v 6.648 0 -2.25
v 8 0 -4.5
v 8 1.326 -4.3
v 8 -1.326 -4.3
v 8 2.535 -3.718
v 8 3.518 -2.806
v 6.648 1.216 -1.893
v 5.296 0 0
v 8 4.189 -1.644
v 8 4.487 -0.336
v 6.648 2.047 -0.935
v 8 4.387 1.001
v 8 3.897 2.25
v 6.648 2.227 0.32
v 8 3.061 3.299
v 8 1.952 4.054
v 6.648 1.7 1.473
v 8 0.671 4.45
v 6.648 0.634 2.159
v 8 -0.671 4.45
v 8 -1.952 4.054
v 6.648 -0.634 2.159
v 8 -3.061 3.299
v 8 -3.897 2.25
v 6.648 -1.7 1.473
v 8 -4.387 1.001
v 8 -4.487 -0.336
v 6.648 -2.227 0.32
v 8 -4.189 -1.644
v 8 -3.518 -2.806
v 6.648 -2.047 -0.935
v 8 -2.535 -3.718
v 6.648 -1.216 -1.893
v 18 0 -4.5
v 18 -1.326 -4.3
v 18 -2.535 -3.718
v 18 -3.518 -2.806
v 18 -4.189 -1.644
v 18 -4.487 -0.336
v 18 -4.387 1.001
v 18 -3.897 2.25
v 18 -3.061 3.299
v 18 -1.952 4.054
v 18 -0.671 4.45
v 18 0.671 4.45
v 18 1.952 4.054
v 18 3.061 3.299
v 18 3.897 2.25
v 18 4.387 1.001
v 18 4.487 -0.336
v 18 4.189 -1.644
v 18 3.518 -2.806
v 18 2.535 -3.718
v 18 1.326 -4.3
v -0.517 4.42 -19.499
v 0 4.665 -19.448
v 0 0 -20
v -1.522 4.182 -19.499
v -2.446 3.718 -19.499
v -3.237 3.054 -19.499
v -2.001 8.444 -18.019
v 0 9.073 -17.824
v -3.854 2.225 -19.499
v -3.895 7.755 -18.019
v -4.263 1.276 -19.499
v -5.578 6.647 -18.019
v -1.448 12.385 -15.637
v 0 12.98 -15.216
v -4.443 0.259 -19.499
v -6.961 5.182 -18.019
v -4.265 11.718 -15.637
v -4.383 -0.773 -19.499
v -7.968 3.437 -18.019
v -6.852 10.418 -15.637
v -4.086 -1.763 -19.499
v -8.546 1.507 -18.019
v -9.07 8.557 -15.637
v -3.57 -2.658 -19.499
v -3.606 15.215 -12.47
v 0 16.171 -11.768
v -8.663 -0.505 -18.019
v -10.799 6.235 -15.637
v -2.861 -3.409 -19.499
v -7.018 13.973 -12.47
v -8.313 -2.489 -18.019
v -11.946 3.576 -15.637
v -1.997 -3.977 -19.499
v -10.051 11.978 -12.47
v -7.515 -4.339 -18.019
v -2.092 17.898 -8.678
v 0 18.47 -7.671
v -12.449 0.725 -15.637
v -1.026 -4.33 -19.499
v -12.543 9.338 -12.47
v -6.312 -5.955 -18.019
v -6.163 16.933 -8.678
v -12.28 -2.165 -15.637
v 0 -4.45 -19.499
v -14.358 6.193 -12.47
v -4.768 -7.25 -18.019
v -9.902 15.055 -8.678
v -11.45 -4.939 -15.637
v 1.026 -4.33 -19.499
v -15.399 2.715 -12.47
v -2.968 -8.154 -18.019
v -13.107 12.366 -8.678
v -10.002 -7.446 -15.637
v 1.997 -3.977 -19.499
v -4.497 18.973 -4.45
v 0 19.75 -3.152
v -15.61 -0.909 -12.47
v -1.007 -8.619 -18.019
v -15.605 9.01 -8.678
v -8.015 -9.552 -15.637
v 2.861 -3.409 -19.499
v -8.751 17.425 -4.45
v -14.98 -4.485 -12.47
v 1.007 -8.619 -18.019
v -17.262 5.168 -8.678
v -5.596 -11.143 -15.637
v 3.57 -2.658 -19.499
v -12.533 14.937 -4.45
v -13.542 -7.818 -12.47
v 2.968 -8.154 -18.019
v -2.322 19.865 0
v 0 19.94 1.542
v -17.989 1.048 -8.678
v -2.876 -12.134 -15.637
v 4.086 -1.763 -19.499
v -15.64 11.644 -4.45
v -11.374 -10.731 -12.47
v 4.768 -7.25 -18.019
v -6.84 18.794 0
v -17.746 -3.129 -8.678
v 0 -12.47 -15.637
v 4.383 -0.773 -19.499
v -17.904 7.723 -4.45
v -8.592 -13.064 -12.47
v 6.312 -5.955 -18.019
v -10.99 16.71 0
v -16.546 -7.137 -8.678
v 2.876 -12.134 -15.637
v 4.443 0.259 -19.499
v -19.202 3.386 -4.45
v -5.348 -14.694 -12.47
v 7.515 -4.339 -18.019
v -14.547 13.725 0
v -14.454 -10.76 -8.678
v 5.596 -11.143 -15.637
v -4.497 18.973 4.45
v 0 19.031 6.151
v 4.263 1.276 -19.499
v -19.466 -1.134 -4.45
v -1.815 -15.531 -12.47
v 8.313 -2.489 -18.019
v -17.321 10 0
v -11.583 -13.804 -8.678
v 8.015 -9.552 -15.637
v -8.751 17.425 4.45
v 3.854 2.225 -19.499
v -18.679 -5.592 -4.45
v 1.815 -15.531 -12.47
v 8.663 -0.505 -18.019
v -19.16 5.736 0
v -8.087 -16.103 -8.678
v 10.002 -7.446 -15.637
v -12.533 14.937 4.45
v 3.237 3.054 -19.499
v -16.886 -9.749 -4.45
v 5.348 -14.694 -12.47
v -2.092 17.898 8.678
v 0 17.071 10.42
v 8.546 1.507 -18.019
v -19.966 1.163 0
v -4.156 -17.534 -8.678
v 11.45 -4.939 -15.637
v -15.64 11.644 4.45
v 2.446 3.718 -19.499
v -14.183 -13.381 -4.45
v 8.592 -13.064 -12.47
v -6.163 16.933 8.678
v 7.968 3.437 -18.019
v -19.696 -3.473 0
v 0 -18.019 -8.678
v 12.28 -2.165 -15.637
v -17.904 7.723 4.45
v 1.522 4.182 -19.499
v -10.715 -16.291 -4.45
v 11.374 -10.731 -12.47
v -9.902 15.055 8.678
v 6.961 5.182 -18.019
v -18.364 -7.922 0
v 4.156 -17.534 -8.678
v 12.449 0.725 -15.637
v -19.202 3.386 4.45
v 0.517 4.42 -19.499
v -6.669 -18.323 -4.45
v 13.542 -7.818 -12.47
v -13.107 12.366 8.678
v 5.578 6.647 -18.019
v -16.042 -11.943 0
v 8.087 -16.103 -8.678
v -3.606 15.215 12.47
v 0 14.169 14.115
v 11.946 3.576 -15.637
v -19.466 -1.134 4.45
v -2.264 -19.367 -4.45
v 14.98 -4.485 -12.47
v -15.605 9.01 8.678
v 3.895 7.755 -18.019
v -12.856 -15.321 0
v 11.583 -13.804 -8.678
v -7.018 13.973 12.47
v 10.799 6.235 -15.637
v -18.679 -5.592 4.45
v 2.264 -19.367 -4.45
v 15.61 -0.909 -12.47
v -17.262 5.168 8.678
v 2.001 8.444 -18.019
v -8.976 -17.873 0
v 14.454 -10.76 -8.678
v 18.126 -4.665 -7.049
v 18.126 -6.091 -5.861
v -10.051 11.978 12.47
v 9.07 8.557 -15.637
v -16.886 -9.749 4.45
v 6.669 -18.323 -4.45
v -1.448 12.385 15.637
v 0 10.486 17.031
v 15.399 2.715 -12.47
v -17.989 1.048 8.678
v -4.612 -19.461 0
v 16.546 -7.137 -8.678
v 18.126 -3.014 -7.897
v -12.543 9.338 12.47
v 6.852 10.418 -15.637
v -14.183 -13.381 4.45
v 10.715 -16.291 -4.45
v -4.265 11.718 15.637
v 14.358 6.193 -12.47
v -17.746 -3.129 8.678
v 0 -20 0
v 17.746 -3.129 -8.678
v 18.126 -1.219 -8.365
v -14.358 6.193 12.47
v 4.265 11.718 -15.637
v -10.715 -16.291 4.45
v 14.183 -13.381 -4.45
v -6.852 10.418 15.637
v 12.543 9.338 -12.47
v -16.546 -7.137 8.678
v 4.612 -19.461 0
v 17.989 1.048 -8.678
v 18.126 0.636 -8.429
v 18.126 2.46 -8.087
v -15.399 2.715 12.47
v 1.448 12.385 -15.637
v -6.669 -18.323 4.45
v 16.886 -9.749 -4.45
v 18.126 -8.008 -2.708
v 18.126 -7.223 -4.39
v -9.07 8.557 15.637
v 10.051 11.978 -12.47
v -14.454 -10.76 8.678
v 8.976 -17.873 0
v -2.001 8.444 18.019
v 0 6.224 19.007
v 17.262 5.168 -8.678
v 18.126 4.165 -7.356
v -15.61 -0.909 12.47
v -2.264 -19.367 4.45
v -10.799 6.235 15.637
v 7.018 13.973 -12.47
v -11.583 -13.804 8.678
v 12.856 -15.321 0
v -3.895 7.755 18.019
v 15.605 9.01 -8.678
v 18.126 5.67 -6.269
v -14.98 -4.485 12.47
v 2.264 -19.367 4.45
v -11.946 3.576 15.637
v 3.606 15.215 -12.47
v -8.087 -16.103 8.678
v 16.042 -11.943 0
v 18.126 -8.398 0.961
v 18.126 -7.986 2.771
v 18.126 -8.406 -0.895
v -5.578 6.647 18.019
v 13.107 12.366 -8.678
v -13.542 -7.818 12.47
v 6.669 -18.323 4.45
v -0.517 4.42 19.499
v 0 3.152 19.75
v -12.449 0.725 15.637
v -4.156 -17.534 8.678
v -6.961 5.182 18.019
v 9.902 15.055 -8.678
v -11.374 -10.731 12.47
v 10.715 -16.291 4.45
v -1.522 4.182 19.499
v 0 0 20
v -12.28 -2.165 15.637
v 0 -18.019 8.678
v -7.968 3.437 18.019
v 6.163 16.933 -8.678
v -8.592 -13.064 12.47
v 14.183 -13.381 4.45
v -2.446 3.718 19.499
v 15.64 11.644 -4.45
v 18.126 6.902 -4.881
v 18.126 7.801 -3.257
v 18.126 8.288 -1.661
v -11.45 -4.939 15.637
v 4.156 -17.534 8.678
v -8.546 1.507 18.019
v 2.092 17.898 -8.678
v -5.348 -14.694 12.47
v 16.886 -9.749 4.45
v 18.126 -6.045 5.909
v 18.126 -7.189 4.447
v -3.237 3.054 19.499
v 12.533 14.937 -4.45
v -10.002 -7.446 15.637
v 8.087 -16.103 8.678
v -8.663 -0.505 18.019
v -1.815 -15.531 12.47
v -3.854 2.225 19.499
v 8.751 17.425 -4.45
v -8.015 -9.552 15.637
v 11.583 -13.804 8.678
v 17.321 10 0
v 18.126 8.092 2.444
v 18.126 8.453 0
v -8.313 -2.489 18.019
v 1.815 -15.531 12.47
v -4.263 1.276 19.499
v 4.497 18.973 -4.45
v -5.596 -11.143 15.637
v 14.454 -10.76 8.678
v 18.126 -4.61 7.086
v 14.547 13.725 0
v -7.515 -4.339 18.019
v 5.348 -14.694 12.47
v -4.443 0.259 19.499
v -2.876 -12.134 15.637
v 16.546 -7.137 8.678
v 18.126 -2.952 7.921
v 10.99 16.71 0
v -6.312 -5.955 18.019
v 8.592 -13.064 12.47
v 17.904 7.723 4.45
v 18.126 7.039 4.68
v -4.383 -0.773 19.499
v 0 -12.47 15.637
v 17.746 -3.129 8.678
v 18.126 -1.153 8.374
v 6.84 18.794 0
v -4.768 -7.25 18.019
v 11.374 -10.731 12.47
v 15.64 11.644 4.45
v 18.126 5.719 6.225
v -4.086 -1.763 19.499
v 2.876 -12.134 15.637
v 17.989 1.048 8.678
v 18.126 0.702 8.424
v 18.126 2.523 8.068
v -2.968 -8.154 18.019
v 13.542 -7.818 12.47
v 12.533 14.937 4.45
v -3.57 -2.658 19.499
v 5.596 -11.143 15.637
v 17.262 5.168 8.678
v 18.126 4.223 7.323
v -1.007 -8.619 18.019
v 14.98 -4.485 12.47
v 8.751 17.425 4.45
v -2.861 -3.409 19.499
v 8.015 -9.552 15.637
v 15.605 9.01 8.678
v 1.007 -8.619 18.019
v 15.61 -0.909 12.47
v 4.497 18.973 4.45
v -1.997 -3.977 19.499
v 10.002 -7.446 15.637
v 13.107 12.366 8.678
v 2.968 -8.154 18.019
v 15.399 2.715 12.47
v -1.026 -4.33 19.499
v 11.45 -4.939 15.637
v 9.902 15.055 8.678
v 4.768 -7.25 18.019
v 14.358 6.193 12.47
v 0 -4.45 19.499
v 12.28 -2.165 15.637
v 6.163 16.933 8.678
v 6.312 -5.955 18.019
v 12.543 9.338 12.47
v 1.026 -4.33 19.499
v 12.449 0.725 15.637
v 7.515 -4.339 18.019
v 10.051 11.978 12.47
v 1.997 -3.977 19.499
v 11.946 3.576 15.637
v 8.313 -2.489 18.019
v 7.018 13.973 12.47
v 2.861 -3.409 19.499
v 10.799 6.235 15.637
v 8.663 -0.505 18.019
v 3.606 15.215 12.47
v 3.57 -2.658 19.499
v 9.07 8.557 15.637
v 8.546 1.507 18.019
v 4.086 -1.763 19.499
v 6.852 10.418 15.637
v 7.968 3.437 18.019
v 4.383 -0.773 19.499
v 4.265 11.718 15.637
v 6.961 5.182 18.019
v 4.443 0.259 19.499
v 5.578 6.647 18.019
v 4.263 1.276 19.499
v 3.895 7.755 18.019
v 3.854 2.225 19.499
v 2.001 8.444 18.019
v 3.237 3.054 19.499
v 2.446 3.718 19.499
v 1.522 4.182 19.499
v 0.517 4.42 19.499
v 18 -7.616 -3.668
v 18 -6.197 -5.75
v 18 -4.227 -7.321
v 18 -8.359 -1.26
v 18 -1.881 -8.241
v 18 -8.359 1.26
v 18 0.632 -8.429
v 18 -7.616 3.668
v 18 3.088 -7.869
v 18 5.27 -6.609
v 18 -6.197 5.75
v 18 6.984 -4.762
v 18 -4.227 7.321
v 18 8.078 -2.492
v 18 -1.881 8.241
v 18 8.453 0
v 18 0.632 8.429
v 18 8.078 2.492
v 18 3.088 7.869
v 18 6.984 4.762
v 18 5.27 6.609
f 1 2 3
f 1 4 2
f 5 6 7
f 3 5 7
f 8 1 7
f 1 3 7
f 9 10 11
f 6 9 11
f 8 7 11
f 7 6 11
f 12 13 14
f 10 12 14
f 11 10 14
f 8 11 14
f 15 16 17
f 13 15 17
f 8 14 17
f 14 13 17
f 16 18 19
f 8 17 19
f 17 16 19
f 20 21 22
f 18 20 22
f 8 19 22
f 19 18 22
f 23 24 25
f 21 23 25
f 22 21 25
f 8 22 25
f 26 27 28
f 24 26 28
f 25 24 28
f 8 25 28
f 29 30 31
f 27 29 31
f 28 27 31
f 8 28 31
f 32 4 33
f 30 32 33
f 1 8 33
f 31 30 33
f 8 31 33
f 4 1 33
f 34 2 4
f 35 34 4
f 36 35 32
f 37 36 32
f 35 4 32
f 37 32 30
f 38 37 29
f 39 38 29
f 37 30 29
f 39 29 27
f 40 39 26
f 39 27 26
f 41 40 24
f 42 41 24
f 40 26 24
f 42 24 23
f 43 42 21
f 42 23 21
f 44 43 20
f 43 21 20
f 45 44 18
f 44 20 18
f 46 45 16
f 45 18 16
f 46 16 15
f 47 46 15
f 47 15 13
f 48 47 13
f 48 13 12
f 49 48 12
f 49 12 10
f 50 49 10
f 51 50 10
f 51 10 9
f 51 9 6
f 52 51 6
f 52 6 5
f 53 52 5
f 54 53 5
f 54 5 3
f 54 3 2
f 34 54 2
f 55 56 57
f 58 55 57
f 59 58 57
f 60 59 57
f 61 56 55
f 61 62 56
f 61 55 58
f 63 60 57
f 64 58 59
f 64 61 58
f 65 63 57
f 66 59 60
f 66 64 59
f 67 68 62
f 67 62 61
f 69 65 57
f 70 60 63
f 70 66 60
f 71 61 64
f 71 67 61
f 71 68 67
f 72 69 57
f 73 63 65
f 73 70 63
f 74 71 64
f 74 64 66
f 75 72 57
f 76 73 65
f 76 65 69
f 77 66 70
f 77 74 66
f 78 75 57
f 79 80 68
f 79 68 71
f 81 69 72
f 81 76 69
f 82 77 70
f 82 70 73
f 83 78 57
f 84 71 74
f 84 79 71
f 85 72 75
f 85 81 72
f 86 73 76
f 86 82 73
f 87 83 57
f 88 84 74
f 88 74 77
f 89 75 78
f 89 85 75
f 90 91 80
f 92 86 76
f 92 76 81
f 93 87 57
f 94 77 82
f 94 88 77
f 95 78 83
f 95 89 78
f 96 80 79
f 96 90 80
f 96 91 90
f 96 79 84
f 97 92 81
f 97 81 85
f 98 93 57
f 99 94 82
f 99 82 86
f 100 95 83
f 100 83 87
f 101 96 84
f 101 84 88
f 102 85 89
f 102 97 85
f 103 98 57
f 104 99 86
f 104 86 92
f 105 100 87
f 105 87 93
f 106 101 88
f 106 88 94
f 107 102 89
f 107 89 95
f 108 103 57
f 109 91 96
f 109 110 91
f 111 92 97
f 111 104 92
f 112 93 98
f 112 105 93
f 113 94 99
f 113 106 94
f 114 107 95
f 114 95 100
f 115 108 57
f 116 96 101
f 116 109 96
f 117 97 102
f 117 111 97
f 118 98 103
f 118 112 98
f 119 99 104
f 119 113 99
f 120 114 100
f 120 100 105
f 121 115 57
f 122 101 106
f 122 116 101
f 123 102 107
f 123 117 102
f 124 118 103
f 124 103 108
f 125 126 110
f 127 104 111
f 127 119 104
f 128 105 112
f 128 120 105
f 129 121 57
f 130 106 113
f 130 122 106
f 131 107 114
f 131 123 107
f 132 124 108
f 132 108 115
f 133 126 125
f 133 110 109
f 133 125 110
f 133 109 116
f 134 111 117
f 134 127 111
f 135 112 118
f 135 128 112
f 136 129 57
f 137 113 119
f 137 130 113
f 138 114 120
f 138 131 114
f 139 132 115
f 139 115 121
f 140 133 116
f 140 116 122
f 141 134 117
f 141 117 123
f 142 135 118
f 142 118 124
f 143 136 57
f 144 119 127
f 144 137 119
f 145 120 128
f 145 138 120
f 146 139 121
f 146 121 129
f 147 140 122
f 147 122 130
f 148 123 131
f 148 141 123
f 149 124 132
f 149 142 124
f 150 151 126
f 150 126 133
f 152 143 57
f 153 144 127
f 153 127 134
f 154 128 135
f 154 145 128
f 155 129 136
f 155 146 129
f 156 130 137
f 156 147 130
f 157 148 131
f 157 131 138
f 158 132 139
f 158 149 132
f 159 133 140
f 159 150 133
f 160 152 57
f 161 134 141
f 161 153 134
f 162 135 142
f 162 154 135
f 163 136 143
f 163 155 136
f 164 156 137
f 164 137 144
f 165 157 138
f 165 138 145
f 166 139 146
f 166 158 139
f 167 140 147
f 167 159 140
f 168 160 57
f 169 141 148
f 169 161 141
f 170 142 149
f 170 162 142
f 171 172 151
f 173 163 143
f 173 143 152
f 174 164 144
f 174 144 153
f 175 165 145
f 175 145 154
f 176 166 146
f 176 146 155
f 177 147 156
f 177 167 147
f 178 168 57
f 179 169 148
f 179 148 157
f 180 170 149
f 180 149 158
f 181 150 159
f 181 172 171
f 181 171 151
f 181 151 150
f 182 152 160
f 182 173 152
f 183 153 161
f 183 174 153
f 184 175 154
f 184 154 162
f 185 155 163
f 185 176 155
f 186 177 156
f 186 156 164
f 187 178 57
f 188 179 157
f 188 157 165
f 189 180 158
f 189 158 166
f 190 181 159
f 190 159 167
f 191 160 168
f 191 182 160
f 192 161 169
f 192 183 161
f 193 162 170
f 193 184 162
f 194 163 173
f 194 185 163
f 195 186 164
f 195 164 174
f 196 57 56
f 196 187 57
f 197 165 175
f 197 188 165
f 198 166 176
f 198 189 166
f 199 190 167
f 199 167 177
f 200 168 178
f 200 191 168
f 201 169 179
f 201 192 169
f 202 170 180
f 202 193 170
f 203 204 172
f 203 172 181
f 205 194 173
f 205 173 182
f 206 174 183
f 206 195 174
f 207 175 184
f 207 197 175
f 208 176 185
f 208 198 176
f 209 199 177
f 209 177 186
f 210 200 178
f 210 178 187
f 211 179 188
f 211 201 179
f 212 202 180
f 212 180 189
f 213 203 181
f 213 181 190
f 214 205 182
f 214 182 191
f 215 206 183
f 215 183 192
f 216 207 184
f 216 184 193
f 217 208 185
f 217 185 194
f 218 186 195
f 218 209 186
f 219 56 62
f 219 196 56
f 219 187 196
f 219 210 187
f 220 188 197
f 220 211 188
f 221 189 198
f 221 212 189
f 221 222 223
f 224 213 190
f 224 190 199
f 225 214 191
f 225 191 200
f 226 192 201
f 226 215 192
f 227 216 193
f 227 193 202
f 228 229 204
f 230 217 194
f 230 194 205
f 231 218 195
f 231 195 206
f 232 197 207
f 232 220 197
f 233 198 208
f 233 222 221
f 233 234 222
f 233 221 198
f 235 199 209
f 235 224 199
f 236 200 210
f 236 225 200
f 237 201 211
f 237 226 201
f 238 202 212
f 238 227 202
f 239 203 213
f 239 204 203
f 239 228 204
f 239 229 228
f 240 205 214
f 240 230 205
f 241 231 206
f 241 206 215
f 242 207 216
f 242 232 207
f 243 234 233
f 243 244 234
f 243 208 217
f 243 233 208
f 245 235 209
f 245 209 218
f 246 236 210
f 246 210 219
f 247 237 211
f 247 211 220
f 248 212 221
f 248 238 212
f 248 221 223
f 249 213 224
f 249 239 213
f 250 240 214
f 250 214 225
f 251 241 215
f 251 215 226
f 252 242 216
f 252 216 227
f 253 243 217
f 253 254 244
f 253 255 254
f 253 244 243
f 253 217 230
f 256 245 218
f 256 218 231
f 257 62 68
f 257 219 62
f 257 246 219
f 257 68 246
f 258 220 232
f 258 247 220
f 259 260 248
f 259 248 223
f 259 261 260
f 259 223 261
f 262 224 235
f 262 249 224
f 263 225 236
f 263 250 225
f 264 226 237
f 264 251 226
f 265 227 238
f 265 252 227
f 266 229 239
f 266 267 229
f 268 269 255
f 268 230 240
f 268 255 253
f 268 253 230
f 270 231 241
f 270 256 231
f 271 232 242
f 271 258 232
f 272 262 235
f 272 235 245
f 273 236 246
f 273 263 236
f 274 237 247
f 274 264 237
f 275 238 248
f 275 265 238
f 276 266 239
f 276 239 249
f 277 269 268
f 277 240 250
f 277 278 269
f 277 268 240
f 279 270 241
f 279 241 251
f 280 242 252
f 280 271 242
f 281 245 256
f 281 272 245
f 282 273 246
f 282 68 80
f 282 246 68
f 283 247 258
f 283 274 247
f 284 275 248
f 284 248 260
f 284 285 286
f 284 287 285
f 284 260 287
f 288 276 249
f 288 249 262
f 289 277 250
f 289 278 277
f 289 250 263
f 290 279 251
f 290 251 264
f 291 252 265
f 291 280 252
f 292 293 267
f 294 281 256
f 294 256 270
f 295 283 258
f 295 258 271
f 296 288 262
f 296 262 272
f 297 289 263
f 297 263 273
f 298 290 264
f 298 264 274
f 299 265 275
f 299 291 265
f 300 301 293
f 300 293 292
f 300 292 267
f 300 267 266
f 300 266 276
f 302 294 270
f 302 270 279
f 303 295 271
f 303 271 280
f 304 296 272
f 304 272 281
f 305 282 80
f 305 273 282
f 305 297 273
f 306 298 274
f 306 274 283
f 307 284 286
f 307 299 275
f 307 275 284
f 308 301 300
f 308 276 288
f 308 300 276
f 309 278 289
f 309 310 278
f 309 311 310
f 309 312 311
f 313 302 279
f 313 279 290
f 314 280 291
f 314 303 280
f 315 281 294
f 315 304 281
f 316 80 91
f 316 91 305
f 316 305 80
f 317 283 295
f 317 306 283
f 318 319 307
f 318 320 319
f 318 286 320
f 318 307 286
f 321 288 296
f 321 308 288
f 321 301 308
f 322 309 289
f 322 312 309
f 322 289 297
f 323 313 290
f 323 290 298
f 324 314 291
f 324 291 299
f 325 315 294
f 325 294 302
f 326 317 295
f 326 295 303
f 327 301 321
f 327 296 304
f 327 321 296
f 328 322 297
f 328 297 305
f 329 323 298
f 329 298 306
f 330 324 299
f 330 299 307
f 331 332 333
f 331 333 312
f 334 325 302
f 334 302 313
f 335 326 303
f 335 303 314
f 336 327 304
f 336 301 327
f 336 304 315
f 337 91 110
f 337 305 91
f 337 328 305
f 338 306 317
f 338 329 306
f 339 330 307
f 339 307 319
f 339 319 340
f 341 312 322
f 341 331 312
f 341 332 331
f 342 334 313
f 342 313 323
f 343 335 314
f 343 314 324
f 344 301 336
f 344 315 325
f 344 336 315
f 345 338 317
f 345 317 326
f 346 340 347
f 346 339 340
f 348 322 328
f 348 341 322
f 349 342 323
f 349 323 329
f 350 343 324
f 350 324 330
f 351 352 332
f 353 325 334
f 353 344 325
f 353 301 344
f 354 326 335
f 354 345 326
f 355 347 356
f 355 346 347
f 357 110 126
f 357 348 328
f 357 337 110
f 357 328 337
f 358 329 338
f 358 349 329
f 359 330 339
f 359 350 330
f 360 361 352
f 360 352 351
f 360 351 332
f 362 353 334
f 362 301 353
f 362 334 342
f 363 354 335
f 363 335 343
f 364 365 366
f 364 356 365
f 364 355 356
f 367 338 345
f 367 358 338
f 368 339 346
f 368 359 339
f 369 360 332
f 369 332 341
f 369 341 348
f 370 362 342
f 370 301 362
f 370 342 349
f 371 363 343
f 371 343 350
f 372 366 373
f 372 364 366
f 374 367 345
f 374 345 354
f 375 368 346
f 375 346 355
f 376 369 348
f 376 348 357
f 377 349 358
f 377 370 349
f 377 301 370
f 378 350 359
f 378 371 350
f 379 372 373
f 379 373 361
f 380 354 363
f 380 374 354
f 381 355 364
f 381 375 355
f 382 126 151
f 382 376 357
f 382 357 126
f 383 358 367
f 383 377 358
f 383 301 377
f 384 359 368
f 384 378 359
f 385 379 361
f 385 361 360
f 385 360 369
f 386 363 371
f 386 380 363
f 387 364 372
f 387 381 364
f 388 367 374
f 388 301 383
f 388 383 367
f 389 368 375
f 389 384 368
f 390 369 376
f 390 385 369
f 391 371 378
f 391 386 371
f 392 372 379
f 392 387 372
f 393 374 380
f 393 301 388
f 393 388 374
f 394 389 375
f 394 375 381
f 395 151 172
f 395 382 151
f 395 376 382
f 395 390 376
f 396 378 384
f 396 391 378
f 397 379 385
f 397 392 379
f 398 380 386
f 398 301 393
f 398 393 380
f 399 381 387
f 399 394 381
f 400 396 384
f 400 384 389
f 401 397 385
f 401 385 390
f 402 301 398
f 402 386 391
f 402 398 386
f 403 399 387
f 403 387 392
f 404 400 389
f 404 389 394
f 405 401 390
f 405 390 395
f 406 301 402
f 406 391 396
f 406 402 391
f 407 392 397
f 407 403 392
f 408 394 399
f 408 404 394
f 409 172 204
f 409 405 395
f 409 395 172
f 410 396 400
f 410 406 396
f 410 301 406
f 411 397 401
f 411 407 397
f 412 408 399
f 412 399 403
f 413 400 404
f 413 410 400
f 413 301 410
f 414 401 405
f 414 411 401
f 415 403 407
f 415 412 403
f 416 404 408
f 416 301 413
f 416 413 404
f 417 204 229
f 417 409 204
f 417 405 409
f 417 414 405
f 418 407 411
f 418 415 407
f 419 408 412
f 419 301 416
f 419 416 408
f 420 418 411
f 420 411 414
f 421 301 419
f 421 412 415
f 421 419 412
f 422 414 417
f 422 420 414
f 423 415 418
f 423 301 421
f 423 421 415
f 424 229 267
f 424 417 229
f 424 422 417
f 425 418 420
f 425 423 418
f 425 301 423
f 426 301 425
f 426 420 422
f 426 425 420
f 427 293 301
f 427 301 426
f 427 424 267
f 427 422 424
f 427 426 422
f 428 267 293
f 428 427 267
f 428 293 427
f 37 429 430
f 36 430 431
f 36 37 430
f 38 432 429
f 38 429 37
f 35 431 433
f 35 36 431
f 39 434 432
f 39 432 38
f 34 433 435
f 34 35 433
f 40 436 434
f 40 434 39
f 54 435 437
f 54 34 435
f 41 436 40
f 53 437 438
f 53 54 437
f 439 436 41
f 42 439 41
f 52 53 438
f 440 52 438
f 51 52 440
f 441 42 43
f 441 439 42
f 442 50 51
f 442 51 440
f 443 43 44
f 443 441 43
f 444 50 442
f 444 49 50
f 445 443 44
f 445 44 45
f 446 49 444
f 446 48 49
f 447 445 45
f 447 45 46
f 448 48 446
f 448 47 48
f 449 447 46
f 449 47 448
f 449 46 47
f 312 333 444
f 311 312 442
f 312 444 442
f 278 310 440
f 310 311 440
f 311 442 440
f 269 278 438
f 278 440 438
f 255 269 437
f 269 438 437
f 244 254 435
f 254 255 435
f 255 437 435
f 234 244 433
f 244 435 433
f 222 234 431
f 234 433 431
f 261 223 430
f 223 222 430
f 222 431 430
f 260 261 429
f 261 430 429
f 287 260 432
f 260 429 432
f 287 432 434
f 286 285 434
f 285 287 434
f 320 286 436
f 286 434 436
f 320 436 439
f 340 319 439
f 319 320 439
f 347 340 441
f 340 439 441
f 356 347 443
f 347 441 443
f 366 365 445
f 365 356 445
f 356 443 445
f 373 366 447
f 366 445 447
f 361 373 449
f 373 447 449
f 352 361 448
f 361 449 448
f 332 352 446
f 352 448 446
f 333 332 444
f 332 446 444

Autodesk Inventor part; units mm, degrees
ref_plane "XZ Plane" through (0, 0, 0) normal (0, 1, 0) x (-1, 0, 0)
ref_plane "XY Plane" through (0, 0, 0) normal (0, 0, 1) x (1, 0, 0)
sketch "Sketch3" plane through (0, 0, 0) normal (1, 0, 0) x (0, 1, 0)
  arc A0 (0, -20) -> (0, 20) centre (0, 0) ccw
  line L0 (0, 20) -> (0, -20)
  line L1 (0, -28) -> (0, 28) projected
  dimension "d15" = 20
revolve "Revolution4" add sketch "Sketch3" angle 360 about axis through (0, 0, -10) along (0, 0, 1)
ref_plane "Work Plane2" through (18, 0, 0) normal (1, 0, 0) x (0, 1, 0)
sketch "Sketch4" plane through (18, 0, 0) normal (1, 0, 0) x (0, 1, 0)
  circle A0 centre (0, 0) radius 8.4531
  circle A1 centre (0, 0) radius 4.5
  dimension "d20" = 9
extrude "Extrusion4" cut sketch "Sketch4" along normal through all contours A0 | A1
hole "Hole1" at (18, 0, 0) direction (-1, 0, 0) diameter 9 depth 10 tip angle 118
thread "Thread1" size "M10x1" class "6H" standard "ANSI Metric M Profile" length 56
properties part number "Knob" material "Iron, Cast"
